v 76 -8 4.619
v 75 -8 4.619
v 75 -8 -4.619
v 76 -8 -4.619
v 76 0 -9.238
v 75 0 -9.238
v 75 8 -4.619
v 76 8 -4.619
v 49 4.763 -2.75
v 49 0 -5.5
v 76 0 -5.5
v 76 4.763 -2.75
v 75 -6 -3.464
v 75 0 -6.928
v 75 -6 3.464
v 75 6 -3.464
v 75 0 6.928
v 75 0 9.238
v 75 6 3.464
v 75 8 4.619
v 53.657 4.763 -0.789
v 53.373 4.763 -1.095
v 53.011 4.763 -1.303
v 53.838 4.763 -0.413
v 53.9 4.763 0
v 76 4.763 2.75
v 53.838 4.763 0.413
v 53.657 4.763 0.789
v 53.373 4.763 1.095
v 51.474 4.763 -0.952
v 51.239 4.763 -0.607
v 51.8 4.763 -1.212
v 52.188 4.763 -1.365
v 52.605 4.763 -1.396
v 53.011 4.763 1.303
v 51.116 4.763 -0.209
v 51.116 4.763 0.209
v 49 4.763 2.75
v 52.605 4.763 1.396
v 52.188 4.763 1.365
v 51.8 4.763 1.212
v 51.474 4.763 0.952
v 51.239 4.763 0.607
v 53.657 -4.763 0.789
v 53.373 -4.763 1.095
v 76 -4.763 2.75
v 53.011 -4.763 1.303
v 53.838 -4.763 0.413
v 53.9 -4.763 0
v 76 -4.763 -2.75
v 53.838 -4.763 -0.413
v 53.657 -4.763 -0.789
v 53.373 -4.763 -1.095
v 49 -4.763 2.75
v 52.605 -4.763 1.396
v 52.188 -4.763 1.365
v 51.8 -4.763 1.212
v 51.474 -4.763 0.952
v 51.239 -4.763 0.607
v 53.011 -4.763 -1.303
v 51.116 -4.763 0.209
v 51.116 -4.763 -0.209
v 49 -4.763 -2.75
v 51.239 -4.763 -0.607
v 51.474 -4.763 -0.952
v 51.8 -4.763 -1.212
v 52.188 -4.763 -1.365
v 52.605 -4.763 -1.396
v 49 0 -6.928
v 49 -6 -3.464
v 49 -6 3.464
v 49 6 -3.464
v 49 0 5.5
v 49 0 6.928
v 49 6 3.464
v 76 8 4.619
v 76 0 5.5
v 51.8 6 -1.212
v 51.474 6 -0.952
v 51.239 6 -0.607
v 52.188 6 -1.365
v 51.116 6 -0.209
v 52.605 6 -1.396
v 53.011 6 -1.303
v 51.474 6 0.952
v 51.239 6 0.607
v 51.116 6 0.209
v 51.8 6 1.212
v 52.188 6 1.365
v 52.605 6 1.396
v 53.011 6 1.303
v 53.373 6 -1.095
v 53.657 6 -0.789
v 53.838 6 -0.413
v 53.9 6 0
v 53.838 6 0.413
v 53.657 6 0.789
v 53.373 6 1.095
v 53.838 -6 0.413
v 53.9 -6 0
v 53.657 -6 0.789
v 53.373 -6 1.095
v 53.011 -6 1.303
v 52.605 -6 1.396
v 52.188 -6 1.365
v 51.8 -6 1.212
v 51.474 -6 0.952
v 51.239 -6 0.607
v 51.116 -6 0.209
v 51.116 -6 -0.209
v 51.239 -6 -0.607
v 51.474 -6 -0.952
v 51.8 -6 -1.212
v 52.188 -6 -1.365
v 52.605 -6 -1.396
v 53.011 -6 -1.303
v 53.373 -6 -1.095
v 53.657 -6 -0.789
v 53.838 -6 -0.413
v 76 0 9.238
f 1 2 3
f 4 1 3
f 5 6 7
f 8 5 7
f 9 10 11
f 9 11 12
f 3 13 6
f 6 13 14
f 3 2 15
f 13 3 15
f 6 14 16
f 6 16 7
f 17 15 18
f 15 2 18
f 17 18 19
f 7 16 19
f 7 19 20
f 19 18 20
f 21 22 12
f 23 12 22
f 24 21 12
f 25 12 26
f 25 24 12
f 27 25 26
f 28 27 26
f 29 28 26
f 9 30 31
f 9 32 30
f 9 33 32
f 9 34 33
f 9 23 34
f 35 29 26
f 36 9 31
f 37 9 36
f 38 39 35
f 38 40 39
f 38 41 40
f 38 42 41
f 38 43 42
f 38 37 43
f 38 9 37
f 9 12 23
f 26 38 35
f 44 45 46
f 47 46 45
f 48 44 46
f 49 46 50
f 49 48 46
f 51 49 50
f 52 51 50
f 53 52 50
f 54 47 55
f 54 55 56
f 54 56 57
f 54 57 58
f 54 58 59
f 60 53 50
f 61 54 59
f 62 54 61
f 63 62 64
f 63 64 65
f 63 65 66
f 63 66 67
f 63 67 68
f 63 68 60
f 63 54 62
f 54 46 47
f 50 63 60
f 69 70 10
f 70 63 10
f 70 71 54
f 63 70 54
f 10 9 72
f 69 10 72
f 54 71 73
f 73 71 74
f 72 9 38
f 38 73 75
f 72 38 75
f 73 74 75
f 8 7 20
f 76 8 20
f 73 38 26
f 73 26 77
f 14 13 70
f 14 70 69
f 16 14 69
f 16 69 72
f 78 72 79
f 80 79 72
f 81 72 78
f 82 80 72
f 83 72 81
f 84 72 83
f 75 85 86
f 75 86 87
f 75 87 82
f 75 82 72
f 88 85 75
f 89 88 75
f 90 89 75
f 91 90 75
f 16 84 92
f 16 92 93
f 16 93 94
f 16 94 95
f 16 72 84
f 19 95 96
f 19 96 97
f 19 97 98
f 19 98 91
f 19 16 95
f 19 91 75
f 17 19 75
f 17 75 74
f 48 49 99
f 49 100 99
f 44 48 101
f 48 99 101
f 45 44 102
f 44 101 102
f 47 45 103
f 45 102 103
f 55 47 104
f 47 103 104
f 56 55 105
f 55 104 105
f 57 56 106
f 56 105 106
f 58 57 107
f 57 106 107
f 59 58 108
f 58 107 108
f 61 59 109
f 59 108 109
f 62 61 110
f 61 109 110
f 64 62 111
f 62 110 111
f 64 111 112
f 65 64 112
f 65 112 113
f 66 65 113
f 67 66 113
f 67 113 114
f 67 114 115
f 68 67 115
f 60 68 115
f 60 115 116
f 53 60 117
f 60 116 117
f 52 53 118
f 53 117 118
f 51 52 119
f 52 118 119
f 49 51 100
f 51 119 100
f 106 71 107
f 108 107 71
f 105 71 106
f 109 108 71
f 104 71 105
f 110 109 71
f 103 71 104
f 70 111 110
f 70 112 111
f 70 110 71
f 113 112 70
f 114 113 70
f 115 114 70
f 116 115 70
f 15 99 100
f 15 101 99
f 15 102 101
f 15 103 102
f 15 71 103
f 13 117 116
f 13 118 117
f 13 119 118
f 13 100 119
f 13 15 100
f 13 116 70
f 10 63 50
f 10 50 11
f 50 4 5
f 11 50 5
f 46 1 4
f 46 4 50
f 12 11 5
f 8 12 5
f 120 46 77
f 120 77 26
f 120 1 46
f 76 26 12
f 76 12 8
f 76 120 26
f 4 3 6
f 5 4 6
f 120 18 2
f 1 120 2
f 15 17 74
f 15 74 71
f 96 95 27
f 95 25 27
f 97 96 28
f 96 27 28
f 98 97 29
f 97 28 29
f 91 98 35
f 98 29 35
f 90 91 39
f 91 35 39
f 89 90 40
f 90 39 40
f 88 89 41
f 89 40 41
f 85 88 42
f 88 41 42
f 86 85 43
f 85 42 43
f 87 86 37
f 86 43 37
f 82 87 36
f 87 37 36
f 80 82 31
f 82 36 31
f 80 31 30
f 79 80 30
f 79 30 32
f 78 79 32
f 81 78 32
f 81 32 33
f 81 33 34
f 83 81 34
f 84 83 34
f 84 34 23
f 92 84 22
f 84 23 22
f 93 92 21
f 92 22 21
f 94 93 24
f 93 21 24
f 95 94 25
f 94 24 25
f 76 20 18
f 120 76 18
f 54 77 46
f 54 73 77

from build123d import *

# Parameters (mm, degrees)
SKETCH202_R     = 1.4
PAD127038_DEPTH = 10
PAD127037_DEPTH = 1
PAD127010_DEPTH = 26


with BuildPart() as setscrewcutout:
    # Sketch202 → Pad127038 (new body, symmetric)
    with BuildSketch(Plane(origin=(75, 0, 0), x_dir=(1, 0, 0), z_dir=(0, -1, 0))):
        with Locations((-22.5, 0)):
            Circle(SKETCH202_R)
    extrude(amount=PAD127038_DEPTH, both=True)


with BuildPart() as endcap:
    # Sketch201 → Pad127037 (new body)
    with BuildSketch(Plane.YZ.offset(75)):
        Polygon((8, 4.618802), (0, 9.237604), (-8, 4.618802), (-8, -4.618802), (0, -9.237604), (8, -4.618802), align=None)
        Polygon((0, 5.5), (-4.76314, 2.75), (-4.76314, -2.75), (0, -5.5), (4.76314, -2.75), (4.76314, 2.75), align=None, mode=Mode.SUBTRACT)
    extrude(amount=PAD127037_DEPTH)


with BuildPart() as wheelaxle:
    # Sketch172 → Pad127010 (new body)
    with BuildSketch(Plane.YZ.offset(75)):
        Polygon((6, 3.464102), (0, 6.928203), (-6, 3.464102), (-6, -3.464102), (0, -6.928203), (6, -3.464102), align=None)
        Polygon((0, 5.5), (-4.76314, 2.75), (-4.76314, -2.75), (0, -5.5), (4.76314, -2.75), (4.76314, 2.75), align=None, mode=Mode.SUBTRACT)
    extrude(amount=-PAD127010_DEPTH)

    # Fusion004020027: union EndCap
    add(endcap.part)

    # Cut007019023: cut SetScrewCutout
    add(setscrewcutout.part, mode=Mode.SUBTRACT)


solid = wheelaxle.part
